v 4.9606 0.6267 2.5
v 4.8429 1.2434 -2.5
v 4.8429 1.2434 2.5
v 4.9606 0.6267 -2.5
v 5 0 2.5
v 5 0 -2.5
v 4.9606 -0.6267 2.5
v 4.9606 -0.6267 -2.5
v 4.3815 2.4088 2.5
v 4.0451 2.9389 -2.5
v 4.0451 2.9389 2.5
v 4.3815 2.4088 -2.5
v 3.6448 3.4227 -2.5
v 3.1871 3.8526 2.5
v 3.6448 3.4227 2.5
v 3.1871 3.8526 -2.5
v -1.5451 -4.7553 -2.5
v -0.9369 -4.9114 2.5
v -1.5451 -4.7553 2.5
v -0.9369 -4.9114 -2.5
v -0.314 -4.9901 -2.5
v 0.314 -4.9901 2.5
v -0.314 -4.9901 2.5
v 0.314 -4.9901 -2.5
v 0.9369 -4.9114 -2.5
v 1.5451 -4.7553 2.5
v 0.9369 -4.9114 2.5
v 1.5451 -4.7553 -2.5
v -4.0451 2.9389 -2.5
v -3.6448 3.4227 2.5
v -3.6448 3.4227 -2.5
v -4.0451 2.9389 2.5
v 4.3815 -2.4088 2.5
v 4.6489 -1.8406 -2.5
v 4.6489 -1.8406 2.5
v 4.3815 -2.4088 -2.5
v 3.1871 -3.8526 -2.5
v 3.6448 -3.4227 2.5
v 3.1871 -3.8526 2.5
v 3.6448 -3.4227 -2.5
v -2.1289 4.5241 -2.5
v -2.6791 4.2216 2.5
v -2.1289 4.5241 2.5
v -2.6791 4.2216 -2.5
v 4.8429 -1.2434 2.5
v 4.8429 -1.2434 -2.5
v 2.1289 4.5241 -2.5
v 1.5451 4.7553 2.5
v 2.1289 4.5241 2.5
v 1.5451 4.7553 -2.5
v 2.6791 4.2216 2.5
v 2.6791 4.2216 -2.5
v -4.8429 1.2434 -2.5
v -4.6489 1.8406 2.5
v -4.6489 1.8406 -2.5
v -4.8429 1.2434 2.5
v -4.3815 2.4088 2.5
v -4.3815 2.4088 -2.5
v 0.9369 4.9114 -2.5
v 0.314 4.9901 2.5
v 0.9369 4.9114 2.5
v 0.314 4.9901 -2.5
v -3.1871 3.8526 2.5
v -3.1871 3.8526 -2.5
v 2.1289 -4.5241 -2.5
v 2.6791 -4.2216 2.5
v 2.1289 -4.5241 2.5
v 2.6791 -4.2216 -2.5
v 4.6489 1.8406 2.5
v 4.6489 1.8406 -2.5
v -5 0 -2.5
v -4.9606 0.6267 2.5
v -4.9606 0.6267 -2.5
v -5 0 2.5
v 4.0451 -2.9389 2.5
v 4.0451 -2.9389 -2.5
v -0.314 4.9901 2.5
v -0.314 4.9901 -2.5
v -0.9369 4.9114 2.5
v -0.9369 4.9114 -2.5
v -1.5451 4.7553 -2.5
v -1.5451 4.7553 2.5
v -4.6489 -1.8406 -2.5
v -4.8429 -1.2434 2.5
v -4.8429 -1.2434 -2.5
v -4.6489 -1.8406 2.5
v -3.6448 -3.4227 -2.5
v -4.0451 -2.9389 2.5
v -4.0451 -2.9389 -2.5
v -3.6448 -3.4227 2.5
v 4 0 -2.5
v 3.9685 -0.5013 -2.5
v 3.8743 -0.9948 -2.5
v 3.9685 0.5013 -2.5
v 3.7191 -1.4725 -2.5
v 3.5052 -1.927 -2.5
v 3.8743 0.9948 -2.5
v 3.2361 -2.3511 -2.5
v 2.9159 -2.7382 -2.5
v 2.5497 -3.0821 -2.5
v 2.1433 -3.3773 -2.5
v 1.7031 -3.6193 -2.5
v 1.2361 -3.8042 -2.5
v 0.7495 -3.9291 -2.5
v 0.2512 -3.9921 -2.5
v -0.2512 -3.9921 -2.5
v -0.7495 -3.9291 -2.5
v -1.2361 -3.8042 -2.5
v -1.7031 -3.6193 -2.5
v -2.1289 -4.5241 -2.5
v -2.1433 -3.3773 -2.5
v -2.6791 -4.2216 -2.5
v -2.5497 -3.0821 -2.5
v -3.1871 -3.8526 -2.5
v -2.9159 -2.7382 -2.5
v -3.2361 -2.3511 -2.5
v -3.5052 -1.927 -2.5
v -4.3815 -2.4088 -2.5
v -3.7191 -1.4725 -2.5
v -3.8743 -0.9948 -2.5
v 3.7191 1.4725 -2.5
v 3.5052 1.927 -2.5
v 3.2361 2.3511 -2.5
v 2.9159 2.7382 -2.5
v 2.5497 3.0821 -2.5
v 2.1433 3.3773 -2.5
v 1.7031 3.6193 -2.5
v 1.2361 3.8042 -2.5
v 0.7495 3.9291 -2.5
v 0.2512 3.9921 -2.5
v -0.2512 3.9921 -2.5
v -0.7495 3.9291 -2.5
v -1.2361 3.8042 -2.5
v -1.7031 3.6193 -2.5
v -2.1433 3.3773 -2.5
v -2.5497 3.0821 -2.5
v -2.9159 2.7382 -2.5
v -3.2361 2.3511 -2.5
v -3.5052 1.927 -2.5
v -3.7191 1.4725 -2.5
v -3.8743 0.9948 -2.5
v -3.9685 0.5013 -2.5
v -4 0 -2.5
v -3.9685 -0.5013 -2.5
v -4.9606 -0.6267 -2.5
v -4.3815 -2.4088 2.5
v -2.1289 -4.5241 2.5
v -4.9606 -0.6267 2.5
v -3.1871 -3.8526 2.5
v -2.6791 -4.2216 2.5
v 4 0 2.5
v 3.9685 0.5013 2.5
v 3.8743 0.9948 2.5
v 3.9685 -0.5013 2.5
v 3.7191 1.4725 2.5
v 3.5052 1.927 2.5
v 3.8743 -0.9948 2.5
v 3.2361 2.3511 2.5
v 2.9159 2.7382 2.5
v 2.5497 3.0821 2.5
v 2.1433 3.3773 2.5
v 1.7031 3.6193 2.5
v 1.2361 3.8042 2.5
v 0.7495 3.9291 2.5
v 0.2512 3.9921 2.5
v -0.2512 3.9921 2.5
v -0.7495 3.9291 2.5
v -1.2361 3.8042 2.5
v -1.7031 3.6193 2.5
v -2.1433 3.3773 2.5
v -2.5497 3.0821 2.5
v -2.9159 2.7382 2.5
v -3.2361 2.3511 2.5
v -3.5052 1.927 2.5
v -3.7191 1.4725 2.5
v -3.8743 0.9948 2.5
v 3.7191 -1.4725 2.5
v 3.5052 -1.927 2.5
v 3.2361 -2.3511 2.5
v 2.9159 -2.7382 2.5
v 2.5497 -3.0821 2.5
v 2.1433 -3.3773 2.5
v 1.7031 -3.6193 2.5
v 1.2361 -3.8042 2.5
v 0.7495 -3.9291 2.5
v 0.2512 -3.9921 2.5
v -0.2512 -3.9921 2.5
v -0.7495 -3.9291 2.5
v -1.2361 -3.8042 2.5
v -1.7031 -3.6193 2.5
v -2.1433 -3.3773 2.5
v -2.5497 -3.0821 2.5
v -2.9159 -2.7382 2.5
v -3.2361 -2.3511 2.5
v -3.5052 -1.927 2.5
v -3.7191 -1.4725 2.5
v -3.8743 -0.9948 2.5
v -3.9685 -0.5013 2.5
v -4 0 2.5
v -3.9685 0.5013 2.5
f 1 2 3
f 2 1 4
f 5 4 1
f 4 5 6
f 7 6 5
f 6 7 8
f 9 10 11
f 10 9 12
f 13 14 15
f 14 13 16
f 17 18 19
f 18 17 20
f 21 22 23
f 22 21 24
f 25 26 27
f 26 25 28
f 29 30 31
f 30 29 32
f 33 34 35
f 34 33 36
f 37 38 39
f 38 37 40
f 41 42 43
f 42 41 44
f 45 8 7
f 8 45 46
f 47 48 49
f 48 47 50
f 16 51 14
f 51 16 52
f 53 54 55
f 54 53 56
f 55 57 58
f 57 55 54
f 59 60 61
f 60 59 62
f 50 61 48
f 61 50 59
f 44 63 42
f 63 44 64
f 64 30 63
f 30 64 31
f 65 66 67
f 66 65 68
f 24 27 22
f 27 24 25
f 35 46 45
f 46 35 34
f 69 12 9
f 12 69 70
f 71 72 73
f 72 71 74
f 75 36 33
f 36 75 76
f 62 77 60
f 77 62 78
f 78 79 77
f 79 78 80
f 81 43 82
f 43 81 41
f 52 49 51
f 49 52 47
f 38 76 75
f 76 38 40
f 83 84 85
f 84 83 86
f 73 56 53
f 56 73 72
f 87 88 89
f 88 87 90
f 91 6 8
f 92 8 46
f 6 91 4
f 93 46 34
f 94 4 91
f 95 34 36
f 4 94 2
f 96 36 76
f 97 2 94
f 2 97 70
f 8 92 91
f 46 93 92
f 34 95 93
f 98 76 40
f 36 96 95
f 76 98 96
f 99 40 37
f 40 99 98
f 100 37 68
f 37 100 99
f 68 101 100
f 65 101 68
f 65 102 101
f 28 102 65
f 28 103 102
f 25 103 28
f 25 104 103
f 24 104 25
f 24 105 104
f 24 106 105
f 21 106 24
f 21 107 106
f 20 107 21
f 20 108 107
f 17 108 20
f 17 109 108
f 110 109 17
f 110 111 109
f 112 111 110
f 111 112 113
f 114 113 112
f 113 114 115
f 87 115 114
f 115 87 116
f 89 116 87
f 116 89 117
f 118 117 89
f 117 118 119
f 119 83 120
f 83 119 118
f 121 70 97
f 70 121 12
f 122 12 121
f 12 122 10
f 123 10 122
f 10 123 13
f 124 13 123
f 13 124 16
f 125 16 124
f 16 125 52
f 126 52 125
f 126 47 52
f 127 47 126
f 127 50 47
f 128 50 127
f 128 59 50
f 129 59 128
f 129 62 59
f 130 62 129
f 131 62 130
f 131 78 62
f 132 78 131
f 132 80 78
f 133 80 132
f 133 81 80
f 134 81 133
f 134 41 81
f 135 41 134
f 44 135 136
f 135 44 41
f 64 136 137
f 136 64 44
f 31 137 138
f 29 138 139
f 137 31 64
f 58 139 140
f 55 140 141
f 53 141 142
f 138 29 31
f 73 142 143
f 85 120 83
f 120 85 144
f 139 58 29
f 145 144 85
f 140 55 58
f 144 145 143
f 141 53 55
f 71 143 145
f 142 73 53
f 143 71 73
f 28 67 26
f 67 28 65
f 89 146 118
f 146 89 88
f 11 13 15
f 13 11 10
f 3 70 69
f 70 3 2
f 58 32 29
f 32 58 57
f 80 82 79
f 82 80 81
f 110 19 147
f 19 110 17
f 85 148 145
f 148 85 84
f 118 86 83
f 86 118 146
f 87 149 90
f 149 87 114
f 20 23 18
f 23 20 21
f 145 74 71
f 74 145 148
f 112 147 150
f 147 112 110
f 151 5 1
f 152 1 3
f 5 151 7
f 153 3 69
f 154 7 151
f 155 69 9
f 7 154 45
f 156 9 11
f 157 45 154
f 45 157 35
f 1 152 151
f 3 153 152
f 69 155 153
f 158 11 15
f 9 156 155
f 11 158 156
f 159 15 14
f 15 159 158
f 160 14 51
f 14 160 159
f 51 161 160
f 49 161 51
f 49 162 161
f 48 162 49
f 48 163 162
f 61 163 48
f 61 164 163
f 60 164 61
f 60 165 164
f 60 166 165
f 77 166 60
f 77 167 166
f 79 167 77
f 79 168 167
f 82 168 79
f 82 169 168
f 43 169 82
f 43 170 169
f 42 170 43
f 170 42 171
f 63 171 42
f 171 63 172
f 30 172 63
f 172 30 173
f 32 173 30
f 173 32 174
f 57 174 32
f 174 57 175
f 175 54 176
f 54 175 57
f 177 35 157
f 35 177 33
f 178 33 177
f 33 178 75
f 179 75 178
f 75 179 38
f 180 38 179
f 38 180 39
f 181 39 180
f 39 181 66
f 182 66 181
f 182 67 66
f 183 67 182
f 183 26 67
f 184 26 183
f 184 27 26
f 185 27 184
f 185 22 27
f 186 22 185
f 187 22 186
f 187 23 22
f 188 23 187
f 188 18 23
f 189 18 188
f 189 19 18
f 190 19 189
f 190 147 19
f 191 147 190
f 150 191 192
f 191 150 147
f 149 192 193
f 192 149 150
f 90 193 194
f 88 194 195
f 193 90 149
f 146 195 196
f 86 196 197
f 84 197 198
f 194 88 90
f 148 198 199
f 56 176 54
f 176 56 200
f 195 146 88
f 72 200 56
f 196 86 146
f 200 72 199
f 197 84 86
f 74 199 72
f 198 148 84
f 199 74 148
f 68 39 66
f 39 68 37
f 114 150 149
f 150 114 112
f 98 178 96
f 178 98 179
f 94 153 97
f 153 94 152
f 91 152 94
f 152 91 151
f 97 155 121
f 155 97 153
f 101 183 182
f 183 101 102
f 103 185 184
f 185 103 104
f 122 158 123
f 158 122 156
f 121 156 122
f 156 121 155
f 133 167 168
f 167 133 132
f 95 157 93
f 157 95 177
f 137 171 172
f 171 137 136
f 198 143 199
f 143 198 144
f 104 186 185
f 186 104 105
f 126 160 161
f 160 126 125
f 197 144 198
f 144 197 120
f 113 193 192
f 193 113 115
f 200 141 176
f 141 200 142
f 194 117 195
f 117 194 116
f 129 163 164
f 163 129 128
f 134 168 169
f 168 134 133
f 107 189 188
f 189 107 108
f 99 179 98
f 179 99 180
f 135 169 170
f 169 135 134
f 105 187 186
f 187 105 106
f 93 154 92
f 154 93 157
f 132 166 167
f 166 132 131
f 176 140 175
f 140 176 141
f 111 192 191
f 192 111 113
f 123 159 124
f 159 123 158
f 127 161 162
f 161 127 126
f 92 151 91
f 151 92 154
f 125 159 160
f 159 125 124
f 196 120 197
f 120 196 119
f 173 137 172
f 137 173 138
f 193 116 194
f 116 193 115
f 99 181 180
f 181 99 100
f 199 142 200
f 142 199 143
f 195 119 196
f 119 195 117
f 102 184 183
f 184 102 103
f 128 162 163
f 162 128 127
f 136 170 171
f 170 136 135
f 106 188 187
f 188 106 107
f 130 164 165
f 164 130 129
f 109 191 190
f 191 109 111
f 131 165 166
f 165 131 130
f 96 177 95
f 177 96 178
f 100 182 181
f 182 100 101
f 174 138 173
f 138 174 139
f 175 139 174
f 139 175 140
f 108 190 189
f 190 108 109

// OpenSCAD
$fn = 50;


difference() {
	union() {
		translate(v = [0, 0, -2.5000000000]) {
			cylinder(h = 5, r = 5.0000000000);
		}
	}
	union() {
		translate(v = [0, 0, -100.0000000000]) {
			cylinder(h = 200, r = 4.0000000000);
		}
	}
}
